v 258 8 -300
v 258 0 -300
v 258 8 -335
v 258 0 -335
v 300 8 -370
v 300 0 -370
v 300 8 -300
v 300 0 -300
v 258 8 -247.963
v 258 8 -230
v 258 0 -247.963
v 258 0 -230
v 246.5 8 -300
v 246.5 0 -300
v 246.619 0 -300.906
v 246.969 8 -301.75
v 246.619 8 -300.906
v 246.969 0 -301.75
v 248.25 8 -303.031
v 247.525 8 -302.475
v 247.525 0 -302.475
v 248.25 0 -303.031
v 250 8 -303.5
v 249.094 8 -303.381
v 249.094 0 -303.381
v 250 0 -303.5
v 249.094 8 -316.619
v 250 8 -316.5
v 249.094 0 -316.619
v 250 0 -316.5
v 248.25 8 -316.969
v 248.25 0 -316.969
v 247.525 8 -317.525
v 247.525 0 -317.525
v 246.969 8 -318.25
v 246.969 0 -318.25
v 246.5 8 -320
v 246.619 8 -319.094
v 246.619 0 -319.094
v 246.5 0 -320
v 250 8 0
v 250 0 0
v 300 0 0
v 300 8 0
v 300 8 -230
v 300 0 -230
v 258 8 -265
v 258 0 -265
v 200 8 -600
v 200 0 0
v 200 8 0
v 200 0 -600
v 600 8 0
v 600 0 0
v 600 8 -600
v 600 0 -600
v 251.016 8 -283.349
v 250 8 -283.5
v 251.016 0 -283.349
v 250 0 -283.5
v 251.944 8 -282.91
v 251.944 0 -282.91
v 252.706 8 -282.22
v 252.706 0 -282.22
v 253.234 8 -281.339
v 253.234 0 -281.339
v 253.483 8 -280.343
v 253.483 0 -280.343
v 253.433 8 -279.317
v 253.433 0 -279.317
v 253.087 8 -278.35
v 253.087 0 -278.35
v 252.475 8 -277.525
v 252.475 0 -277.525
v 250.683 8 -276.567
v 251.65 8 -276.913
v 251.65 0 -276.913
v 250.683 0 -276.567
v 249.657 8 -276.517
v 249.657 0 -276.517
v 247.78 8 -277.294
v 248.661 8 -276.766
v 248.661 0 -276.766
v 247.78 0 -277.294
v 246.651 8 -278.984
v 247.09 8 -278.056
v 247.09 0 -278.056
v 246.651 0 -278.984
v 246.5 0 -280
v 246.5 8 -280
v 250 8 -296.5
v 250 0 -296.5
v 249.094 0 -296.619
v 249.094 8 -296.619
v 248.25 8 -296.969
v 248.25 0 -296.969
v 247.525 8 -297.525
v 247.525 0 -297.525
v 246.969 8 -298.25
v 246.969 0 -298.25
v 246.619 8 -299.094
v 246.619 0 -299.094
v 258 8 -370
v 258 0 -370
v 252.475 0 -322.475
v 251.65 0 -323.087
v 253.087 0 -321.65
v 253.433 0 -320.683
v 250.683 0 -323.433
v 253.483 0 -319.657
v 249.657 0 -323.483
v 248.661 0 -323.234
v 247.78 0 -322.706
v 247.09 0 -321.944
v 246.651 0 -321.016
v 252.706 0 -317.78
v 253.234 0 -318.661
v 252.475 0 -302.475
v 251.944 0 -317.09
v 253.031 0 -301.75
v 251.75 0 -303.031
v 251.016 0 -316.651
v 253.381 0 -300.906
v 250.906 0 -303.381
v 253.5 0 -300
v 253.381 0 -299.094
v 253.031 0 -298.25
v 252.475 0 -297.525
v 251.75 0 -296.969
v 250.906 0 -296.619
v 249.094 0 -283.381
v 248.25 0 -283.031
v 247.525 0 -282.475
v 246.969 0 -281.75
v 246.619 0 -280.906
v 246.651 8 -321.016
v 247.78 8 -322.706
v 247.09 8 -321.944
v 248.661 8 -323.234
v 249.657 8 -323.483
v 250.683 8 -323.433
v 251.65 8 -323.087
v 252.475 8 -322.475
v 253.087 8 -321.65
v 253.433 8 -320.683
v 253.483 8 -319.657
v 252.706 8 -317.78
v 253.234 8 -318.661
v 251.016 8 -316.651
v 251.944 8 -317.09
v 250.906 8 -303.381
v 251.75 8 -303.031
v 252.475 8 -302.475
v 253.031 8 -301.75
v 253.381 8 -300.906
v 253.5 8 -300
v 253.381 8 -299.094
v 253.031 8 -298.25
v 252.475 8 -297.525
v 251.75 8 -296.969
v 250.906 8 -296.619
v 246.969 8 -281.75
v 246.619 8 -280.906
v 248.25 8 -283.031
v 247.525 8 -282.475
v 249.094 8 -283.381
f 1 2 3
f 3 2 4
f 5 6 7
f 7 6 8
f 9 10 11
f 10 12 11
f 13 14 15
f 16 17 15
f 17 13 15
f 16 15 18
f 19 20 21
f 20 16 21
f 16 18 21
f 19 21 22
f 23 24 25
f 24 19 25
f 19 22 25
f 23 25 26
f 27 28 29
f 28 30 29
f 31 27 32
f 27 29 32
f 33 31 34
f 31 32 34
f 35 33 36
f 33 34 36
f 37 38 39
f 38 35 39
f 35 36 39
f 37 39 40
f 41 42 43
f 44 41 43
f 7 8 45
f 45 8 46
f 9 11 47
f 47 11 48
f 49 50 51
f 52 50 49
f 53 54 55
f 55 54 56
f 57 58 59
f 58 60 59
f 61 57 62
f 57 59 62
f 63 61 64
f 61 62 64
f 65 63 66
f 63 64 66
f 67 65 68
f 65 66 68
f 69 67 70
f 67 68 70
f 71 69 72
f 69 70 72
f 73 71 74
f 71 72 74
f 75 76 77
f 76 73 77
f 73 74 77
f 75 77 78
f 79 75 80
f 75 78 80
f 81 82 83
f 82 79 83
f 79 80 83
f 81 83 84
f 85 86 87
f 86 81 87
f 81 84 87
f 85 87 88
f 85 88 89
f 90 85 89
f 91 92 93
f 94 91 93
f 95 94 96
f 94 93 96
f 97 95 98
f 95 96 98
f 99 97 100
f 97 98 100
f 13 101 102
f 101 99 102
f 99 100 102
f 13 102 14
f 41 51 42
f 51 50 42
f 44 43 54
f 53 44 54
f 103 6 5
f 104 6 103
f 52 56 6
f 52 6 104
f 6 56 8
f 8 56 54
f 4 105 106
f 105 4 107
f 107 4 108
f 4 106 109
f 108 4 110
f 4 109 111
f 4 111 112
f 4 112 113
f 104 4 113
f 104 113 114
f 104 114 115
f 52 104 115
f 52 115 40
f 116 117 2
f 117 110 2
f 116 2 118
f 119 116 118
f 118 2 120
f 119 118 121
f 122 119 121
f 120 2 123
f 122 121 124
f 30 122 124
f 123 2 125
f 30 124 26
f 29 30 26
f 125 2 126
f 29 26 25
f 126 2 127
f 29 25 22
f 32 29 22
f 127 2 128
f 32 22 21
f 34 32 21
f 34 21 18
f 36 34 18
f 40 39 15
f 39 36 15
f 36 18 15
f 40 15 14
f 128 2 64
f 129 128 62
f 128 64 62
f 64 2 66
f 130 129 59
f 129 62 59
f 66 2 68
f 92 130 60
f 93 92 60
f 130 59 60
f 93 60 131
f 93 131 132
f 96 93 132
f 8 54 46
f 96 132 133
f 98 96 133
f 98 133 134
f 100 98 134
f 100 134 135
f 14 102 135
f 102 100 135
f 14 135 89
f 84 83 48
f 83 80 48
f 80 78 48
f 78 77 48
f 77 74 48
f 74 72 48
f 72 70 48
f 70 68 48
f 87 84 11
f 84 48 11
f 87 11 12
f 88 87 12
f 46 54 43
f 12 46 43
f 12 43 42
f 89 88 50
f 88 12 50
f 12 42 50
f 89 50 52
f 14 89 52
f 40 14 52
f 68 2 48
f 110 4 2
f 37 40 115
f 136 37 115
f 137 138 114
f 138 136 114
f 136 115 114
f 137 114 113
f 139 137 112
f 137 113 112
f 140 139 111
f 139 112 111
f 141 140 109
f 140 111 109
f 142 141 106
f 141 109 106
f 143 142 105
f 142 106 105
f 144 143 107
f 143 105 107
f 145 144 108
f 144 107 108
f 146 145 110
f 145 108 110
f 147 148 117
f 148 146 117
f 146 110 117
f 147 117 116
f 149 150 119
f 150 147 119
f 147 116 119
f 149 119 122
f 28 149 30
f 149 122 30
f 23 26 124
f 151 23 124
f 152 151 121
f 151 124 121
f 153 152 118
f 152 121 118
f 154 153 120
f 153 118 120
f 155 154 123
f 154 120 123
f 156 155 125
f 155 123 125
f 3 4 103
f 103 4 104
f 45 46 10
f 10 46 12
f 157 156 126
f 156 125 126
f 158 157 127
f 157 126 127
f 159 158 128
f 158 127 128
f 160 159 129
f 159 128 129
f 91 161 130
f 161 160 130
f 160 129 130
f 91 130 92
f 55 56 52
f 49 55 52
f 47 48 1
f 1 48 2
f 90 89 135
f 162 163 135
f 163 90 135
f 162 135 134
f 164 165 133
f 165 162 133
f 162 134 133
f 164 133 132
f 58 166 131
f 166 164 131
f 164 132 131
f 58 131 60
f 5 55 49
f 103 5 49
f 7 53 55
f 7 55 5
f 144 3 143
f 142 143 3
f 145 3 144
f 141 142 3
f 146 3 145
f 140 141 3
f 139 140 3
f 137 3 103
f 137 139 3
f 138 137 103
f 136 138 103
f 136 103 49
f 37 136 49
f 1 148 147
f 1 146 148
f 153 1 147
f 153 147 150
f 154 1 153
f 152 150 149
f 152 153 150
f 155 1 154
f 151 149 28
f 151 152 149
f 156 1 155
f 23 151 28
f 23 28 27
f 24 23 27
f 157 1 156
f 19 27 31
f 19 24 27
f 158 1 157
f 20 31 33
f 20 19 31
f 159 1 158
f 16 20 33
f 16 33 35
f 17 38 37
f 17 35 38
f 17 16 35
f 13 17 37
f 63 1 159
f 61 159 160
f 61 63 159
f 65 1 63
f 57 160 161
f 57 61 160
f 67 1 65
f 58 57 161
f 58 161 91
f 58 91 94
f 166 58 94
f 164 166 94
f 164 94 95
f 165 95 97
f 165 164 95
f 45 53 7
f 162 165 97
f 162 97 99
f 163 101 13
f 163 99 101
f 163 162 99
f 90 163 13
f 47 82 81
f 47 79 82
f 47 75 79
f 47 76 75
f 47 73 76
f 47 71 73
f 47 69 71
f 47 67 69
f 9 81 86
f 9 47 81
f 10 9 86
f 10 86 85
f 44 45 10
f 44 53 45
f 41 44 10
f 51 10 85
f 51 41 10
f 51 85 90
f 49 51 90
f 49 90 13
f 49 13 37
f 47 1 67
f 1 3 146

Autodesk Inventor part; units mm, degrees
ref_plane "YZ Plane" through (0, 0, 0) normal (1, 0, 0) x (0, 1, 0)
ref_plane "XZ Plane" through (0, 0, 0) normal (0, 1, 0) x (-1, 0, 0)
ref_plane "XY Plane" through (0, 0, 0) normal (0, 0, 1) x (1, 0, 0)
sketch "Эскиз1" plane through (0, 0, 0) normal (0, 1, 0) x (-1, 0, 0)
  line L0 (-200, 0) -> (-600, 0)
  line L1 (-600, 0) -> (-600, -600)
  line L2 (-600, -600) -> (-200, -600)
  line L3 (-200, 0) -> (-250, 0)
  line L4 (-250, 0) -> (-200, 0)
  line L5 (-258, -230) -> (-258, -370)
  line L6 (-300, -230) -> (-258, -230)
  line L7 (-300, -370) -> (-258, -370)
  line L8 (-258, -335) -> (-258, -265)
  line L9 (-300, 0) -> (-200, 0)
  line L10 (-258, -300) -> (-258, -247.9631)
  line L11 (-258, -300) -> (-250, -300)
  line L12 (-250, -300) -> (-250, -280)
  line L13 (-250, -280) -> (-250, -300)
  line L14 (-250, -300) -> (-250, -320)
  circle A0 centre (-250, -320) radius 3.5
  circle A1 centre (-250, -300) radius 3.5
  circle A2 centre (-250, -280) radius 3.5
  line L15 (-300, -300) -> (-300, -230)
  line L16 (-600, 0) -> (-250, 0)
  line L17 (-600, 0) -> (-200, 0)
  line L18 (-200, 0) -> (-200, -600)
  line L19 (-300, -370) -> (-300, -300)
  point P0 (0, 0)
  point P1 (-200, -600)
  point P2 (-200, 0)
  dimension "d1" = 600
  dimension "d16" = 140
  dimension "d17" = 42
  dimension "d23" = 8
  dimension "d24" = 20
  dimension "d26" = 20
  dimension "d27" = 7
  dimension "d28" = 7
  dimension "d29" = 7
  dimension "d30" = 70
  dimension "d31" = 300
  dimension "d33" = 400
extrude "Выдавливание2" add sketch "Эскиз1" along normal blind 8
properties part number "Нижняя полка"
